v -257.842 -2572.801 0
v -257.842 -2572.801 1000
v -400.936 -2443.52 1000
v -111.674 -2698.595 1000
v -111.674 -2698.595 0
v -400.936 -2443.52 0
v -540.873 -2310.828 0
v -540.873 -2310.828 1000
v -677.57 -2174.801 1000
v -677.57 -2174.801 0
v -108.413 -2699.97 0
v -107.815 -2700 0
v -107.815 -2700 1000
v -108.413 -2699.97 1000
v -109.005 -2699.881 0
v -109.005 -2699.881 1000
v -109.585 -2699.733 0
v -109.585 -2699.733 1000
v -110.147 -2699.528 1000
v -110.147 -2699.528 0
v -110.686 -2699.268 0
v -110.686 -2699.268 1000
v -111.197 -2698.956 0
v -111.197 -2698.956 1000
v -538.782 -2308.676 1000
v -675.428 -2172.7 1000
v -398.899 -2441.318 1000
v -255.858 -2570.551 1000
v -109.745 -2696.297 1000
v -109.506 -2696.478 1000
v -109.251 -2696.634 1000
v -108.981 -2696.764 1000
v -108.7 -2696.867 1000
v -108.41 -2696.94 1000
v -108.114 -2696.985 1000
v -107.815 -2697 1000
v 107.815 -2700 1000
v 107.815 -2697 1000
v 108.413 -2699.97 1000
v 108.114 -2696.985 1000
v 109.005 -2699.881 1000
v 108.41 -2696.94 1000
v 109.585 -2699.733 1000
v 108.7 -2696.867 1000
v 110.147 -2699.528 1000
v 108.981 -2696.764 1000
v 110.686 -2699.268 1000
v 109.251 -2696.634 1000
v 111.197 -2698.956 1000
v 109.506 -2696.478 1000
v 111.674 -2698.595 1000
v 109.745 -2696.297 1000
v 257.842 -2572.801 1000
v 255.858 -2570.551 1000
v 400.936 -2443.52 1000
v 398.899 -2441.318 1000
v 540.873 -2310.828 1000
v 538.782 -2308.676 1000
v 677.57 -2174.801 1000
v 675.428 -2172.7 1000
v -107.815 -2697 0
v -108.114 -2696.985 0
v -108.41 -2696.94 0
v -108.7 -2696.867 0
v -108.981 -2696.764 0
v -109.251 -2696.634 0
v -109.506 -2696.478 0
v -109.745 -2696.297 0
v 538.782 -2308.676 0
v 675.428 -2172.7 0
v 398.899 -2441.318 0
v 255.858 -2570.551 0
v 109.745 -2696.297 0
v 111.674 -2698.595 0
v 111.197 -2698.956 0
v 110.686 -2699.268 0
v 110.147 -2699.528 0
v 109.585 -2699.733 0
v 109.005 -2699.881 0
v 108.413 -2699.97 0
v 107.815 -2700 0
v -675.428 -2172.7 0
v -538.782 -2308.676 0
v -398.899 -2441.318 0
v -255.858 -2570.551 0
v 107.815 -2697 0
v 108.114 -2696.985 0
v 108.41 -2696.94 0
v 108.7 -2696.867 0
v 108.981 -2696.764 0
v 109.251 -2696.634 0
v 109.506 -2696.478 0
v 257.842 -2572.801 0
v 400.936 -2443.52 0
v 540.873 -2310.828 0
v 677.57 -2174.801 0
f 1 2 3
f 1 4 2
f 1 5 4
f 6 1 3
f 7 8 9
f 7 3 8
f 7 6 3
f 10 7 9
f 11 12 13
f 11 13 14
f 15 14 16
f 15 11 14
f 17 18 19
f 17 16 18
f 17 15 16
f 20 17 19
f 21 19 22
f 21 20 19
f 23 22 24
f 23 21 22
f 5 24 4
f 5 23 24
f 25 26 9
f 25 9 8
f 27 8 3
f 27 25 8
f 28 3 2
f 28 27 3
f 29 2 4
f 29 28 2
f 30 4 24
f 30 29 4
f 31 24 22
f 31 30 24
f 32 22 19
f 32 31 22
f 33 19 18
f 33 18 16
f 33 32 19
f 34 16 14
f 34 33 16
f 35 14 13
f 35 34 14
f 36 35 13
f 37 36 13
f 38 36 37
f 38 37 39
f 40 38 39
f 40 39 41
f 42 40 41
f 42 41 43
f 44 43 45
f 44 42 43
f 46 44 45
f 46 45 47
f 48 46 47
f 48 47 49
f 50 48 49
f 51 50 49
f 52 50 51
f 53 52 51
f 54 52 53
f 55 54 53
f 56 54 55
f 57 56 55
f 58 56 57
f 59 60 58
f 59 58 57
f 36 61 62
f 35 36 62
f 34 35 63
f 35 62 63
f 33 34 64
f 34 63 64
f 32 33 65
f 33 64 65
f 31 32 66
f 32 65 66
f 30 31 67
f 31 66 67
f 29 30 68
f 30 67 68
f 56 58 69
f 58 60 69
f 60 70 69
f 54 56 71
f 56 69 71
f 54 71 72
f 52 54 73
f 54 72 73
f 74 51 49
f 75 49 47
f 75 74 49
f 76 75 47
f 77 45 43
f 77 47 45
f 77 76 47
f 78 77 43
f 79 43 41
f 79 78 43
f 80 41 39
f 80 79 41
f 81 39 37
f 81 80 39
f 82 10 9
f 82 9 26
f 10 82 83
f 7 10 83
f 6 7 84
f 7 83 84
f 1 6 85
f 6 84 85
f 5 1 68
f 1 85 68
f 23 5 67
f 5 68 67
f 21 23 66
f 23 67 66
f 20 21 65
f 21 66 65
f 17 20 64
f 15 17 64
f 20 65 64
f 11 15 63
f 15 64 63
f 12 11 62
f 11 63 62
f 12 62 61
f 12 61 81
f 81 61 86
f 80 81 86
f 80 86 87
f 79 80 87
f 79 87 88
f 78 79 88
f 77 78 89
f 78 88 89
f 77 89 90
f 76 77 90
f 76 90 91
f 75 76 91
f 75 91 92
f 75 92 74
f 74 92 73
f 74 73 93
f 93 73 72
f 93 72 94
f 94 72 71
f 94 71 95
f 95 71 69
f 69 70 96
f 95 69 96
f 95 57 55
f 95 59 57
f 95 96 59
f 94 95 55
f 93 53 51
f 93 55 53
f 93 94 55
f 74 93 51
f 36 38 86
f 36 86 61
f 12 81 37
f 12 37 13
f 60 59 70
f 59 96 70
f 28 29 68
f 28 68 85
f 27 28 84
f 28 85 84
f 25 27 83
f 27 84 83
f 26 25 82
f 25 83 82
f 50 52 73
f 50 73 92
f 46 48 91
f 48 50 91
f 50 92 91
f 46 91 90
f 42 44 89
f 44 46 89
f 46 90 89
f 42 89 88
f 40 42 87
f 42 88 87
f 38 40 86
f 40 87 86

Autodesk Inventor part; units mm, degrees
ref_plane "YZ Plane" through (0, 0, 0) normal (1, 0, 0) x (0, 1, 0)
ref_plane "XZ Plane" through (0, 0, 0) normal (0, 1, 0) x (-1, 0, 0)
ref_plane "XY Plane" through (0, 0, 0) normal (0, 0, 1) x (1, 0, 0)
sketch "Sketch1" plane through (0, 0, 0) normal (0, 0, 1) x (1, 0, 0)
  line L0 (-750, 0) -> (750, 0) construction
  line L1 (750, 0) -> (750, -2100) construction
  line L2 (750, -2100) -> (110, -2700) construction
  line L3 (107.8152, -2700) -> (-107.8152, -2700)
  line L4 (-110, -2700) -> (-750, -2100) construction
  line L5 (-750, -2100) -> (-750, 0) construction
  arc A0 (745.2369, 0.4471) -> (-745.2369, 0.4471) centre (0, -7964.7662) ccw construction
  arc A1 (-750.6265, -4.7429) -> (-777.5832, -235) centre (7180.7944, -1050) ccw construction
  arc A2 (-777.5832, -235) -> (-750.1285, -2099.0286) centre (7180.7944, -1050) ccw construction
  arc A3 (750.1285, -2099.0286) -> (777.5832, -235) centre (-7180.7944, -1050) ccw construction
  arc A4 (777.5832, -235) -> (750.6265, -4.7429) centre (-7180.7944, -1050) ccw construction
  line L6 (-777.5832, -235) -> (777.5832, -235) construction
  arc A5 (-749.3229, -2100.7083) -> (-677.5699, -2174.8011) centre (5033.2984, 3427.5183) ccw construction
  line L7 (-750, -2100) -> (750, -2100) construction
  line L8 (-547.1729, -2035.7109) -> (-801.0834, -2306.5488) construction
  arc A6 (-677.5699, -2174.8011) -> (-111.6739, -2698.5946) centre (5033.2984, 3427.5183) ccw
  arc A7 (-745.2369, 0.4471) -> (-750.6265, -4.7429) centre (-744.6779, -5.5268) ccw construction
  arc A8 (750.6265, -4.7429) -> (745.2369, 0.4471) centre (744.6779, -5.5268) ccw construction
  arc A9 (-750.1285, -2099.0286) -> (-749.3229, -2100.7083) centre (-747.1545, -2098.6352) ccw construction
  arc A10 (111.6739, -2698.5946) -> (677.5699, -2174.8011) centre (-5033.2984, 3427.5183) ccw
  line L9 (553.8195, -2042.8006) -> (794.4368, -2299.4591) construction
  arc A11 (677.5699, -2174.8011) -> (749.3229, -2100.7083) centre (-5033.2984, 3427.5183) ccw construction
  arc A12 (749.3229, -2100.7083) -> (750.1285, -2099.0286) centre (747.1545, -2098.6352) ccw construction
  arc A13 (-111.6739, -2698.5946) -> (-107.8152, -2700) centre (-107.8152, -2694) ccw
  arc A14 (107.8152, -2700) -> (111.6739, -2698.5946) centre (107.8152, -2694) ccw
  point P0 (0, 0)
  point P1 (0, 0)
  point P2 (0, 0)
  point P3 (0, -2700)
  point P4 (-674.1281, -2171.1299)
  point P5 (674.1281, -2171.1299)
  dimension "d19" = 1500
  dimension "d20" = 2100
  dimension "d21" = 220
  dimension "d22" = 2700
  dimension "d23" = 8000
  dimension "d24" = 8000
  dimension "d25" = 8000
  dimension "d26" = 235
  dimension "d27" = 8000
  dimension "d28" = 104
  dimension "d29" = 6
  dimension "d30" = 3
  dimension "d31" = 8000
  dimension "d32" = 104
  dimension "d33" = 6
contour flange "Contour Flange1" sketch "Sketch1" thickness 3 bend radius 3 width 1000 along (0, 0, 1) mid plane no both sides no wall seen from (-400.9365, -2443.52, 0) lies toward (0.6792794, 0.7338798, 0) curves A6 A13 L3 A14 A10
bend "Bend1"
corner "Corner1"
equation "\"d19\" = Бак_ширина_общая"
equation "\"d20\" = Бак_высота_до_конуса"
equation "\"d21\" = Бак_брюхо_ширина_полки"
equation "\"d22\" = Бак_высота_общая"
equation "\"d23\" = Бак_радиус_стенок_общий"
equation "\"d24\" = Бак_радиус_стенок_общий"
equation "\"d25\" = Бак_радиус_стенок_общий"
equation "\"d26\" = Бак_спина_длина_фланцев"
equation "\"d27\" = Бак_радиус_стенок_общий"
equation "\"d28\" = Бак_борт_длина_фланца"
equation "\"d29\" = d41 + d42"
equation "\"d30\" = d41"
equation "\"d31\" = Бак_радиус_стенок_общий"
equation "\"d32\" = Бак_борт_длина_фланца"
equation "\"d33\" = Thickness + BendRadius"
equation "\"d7\" = Thickness"
equation "\"d8\" = BendReliefWidth"
equation "\"d9\" = BendReliefDepth"
equation "\"d10\" = MinimumRemnant"
equation "\"d11\" = TransitionRadius"
equation "\"d13\" = BendRadius"
equation "\"d15\" = CornerReliefSize"
equation "\"d16\" = GapSize"
equation "\"d17\" = JacobiRadiusSize"
equation "\"BendRadius\" = Thickness"
equation "\"BendReliefWidth\" = Thickness"
equation "\"BendReliefDepth\" = 0.5 * Thickness"
equation "\"CornerReliefSize\" = 4 * Thickness"
equation "\"MinimumRemnant\" = 2 * Thickness"
equation "\"TransitionRadius\" = BendRadius"
equation "\"JacobiRadiusSize\" = BendRadius"
equation "\"GapSize\" = Thickness"
equation "\"d42\" = d41"
equation "\"Бак_ширина_общая\" = 1500"
equation "\"Бак_высота_до_конуса\" = 2100"
equation "\"Бак_брюхо_ширина_полки\" = 220"
equation "\"Бак_радиус_стенок_общий\" = 8000"
equation "\"Бак_спина_длина_фланцев\" = 235"
equation "\"d41\" = 3"
equation "\"Thickness\" = 3"
equation "\"Бак_высота_общая\" = 2700"
equation "\"Бак_борт_длина_фланца\" = 104"
properties part number "МОО 030 лист брюхо 1" material "Stainless Steel"
